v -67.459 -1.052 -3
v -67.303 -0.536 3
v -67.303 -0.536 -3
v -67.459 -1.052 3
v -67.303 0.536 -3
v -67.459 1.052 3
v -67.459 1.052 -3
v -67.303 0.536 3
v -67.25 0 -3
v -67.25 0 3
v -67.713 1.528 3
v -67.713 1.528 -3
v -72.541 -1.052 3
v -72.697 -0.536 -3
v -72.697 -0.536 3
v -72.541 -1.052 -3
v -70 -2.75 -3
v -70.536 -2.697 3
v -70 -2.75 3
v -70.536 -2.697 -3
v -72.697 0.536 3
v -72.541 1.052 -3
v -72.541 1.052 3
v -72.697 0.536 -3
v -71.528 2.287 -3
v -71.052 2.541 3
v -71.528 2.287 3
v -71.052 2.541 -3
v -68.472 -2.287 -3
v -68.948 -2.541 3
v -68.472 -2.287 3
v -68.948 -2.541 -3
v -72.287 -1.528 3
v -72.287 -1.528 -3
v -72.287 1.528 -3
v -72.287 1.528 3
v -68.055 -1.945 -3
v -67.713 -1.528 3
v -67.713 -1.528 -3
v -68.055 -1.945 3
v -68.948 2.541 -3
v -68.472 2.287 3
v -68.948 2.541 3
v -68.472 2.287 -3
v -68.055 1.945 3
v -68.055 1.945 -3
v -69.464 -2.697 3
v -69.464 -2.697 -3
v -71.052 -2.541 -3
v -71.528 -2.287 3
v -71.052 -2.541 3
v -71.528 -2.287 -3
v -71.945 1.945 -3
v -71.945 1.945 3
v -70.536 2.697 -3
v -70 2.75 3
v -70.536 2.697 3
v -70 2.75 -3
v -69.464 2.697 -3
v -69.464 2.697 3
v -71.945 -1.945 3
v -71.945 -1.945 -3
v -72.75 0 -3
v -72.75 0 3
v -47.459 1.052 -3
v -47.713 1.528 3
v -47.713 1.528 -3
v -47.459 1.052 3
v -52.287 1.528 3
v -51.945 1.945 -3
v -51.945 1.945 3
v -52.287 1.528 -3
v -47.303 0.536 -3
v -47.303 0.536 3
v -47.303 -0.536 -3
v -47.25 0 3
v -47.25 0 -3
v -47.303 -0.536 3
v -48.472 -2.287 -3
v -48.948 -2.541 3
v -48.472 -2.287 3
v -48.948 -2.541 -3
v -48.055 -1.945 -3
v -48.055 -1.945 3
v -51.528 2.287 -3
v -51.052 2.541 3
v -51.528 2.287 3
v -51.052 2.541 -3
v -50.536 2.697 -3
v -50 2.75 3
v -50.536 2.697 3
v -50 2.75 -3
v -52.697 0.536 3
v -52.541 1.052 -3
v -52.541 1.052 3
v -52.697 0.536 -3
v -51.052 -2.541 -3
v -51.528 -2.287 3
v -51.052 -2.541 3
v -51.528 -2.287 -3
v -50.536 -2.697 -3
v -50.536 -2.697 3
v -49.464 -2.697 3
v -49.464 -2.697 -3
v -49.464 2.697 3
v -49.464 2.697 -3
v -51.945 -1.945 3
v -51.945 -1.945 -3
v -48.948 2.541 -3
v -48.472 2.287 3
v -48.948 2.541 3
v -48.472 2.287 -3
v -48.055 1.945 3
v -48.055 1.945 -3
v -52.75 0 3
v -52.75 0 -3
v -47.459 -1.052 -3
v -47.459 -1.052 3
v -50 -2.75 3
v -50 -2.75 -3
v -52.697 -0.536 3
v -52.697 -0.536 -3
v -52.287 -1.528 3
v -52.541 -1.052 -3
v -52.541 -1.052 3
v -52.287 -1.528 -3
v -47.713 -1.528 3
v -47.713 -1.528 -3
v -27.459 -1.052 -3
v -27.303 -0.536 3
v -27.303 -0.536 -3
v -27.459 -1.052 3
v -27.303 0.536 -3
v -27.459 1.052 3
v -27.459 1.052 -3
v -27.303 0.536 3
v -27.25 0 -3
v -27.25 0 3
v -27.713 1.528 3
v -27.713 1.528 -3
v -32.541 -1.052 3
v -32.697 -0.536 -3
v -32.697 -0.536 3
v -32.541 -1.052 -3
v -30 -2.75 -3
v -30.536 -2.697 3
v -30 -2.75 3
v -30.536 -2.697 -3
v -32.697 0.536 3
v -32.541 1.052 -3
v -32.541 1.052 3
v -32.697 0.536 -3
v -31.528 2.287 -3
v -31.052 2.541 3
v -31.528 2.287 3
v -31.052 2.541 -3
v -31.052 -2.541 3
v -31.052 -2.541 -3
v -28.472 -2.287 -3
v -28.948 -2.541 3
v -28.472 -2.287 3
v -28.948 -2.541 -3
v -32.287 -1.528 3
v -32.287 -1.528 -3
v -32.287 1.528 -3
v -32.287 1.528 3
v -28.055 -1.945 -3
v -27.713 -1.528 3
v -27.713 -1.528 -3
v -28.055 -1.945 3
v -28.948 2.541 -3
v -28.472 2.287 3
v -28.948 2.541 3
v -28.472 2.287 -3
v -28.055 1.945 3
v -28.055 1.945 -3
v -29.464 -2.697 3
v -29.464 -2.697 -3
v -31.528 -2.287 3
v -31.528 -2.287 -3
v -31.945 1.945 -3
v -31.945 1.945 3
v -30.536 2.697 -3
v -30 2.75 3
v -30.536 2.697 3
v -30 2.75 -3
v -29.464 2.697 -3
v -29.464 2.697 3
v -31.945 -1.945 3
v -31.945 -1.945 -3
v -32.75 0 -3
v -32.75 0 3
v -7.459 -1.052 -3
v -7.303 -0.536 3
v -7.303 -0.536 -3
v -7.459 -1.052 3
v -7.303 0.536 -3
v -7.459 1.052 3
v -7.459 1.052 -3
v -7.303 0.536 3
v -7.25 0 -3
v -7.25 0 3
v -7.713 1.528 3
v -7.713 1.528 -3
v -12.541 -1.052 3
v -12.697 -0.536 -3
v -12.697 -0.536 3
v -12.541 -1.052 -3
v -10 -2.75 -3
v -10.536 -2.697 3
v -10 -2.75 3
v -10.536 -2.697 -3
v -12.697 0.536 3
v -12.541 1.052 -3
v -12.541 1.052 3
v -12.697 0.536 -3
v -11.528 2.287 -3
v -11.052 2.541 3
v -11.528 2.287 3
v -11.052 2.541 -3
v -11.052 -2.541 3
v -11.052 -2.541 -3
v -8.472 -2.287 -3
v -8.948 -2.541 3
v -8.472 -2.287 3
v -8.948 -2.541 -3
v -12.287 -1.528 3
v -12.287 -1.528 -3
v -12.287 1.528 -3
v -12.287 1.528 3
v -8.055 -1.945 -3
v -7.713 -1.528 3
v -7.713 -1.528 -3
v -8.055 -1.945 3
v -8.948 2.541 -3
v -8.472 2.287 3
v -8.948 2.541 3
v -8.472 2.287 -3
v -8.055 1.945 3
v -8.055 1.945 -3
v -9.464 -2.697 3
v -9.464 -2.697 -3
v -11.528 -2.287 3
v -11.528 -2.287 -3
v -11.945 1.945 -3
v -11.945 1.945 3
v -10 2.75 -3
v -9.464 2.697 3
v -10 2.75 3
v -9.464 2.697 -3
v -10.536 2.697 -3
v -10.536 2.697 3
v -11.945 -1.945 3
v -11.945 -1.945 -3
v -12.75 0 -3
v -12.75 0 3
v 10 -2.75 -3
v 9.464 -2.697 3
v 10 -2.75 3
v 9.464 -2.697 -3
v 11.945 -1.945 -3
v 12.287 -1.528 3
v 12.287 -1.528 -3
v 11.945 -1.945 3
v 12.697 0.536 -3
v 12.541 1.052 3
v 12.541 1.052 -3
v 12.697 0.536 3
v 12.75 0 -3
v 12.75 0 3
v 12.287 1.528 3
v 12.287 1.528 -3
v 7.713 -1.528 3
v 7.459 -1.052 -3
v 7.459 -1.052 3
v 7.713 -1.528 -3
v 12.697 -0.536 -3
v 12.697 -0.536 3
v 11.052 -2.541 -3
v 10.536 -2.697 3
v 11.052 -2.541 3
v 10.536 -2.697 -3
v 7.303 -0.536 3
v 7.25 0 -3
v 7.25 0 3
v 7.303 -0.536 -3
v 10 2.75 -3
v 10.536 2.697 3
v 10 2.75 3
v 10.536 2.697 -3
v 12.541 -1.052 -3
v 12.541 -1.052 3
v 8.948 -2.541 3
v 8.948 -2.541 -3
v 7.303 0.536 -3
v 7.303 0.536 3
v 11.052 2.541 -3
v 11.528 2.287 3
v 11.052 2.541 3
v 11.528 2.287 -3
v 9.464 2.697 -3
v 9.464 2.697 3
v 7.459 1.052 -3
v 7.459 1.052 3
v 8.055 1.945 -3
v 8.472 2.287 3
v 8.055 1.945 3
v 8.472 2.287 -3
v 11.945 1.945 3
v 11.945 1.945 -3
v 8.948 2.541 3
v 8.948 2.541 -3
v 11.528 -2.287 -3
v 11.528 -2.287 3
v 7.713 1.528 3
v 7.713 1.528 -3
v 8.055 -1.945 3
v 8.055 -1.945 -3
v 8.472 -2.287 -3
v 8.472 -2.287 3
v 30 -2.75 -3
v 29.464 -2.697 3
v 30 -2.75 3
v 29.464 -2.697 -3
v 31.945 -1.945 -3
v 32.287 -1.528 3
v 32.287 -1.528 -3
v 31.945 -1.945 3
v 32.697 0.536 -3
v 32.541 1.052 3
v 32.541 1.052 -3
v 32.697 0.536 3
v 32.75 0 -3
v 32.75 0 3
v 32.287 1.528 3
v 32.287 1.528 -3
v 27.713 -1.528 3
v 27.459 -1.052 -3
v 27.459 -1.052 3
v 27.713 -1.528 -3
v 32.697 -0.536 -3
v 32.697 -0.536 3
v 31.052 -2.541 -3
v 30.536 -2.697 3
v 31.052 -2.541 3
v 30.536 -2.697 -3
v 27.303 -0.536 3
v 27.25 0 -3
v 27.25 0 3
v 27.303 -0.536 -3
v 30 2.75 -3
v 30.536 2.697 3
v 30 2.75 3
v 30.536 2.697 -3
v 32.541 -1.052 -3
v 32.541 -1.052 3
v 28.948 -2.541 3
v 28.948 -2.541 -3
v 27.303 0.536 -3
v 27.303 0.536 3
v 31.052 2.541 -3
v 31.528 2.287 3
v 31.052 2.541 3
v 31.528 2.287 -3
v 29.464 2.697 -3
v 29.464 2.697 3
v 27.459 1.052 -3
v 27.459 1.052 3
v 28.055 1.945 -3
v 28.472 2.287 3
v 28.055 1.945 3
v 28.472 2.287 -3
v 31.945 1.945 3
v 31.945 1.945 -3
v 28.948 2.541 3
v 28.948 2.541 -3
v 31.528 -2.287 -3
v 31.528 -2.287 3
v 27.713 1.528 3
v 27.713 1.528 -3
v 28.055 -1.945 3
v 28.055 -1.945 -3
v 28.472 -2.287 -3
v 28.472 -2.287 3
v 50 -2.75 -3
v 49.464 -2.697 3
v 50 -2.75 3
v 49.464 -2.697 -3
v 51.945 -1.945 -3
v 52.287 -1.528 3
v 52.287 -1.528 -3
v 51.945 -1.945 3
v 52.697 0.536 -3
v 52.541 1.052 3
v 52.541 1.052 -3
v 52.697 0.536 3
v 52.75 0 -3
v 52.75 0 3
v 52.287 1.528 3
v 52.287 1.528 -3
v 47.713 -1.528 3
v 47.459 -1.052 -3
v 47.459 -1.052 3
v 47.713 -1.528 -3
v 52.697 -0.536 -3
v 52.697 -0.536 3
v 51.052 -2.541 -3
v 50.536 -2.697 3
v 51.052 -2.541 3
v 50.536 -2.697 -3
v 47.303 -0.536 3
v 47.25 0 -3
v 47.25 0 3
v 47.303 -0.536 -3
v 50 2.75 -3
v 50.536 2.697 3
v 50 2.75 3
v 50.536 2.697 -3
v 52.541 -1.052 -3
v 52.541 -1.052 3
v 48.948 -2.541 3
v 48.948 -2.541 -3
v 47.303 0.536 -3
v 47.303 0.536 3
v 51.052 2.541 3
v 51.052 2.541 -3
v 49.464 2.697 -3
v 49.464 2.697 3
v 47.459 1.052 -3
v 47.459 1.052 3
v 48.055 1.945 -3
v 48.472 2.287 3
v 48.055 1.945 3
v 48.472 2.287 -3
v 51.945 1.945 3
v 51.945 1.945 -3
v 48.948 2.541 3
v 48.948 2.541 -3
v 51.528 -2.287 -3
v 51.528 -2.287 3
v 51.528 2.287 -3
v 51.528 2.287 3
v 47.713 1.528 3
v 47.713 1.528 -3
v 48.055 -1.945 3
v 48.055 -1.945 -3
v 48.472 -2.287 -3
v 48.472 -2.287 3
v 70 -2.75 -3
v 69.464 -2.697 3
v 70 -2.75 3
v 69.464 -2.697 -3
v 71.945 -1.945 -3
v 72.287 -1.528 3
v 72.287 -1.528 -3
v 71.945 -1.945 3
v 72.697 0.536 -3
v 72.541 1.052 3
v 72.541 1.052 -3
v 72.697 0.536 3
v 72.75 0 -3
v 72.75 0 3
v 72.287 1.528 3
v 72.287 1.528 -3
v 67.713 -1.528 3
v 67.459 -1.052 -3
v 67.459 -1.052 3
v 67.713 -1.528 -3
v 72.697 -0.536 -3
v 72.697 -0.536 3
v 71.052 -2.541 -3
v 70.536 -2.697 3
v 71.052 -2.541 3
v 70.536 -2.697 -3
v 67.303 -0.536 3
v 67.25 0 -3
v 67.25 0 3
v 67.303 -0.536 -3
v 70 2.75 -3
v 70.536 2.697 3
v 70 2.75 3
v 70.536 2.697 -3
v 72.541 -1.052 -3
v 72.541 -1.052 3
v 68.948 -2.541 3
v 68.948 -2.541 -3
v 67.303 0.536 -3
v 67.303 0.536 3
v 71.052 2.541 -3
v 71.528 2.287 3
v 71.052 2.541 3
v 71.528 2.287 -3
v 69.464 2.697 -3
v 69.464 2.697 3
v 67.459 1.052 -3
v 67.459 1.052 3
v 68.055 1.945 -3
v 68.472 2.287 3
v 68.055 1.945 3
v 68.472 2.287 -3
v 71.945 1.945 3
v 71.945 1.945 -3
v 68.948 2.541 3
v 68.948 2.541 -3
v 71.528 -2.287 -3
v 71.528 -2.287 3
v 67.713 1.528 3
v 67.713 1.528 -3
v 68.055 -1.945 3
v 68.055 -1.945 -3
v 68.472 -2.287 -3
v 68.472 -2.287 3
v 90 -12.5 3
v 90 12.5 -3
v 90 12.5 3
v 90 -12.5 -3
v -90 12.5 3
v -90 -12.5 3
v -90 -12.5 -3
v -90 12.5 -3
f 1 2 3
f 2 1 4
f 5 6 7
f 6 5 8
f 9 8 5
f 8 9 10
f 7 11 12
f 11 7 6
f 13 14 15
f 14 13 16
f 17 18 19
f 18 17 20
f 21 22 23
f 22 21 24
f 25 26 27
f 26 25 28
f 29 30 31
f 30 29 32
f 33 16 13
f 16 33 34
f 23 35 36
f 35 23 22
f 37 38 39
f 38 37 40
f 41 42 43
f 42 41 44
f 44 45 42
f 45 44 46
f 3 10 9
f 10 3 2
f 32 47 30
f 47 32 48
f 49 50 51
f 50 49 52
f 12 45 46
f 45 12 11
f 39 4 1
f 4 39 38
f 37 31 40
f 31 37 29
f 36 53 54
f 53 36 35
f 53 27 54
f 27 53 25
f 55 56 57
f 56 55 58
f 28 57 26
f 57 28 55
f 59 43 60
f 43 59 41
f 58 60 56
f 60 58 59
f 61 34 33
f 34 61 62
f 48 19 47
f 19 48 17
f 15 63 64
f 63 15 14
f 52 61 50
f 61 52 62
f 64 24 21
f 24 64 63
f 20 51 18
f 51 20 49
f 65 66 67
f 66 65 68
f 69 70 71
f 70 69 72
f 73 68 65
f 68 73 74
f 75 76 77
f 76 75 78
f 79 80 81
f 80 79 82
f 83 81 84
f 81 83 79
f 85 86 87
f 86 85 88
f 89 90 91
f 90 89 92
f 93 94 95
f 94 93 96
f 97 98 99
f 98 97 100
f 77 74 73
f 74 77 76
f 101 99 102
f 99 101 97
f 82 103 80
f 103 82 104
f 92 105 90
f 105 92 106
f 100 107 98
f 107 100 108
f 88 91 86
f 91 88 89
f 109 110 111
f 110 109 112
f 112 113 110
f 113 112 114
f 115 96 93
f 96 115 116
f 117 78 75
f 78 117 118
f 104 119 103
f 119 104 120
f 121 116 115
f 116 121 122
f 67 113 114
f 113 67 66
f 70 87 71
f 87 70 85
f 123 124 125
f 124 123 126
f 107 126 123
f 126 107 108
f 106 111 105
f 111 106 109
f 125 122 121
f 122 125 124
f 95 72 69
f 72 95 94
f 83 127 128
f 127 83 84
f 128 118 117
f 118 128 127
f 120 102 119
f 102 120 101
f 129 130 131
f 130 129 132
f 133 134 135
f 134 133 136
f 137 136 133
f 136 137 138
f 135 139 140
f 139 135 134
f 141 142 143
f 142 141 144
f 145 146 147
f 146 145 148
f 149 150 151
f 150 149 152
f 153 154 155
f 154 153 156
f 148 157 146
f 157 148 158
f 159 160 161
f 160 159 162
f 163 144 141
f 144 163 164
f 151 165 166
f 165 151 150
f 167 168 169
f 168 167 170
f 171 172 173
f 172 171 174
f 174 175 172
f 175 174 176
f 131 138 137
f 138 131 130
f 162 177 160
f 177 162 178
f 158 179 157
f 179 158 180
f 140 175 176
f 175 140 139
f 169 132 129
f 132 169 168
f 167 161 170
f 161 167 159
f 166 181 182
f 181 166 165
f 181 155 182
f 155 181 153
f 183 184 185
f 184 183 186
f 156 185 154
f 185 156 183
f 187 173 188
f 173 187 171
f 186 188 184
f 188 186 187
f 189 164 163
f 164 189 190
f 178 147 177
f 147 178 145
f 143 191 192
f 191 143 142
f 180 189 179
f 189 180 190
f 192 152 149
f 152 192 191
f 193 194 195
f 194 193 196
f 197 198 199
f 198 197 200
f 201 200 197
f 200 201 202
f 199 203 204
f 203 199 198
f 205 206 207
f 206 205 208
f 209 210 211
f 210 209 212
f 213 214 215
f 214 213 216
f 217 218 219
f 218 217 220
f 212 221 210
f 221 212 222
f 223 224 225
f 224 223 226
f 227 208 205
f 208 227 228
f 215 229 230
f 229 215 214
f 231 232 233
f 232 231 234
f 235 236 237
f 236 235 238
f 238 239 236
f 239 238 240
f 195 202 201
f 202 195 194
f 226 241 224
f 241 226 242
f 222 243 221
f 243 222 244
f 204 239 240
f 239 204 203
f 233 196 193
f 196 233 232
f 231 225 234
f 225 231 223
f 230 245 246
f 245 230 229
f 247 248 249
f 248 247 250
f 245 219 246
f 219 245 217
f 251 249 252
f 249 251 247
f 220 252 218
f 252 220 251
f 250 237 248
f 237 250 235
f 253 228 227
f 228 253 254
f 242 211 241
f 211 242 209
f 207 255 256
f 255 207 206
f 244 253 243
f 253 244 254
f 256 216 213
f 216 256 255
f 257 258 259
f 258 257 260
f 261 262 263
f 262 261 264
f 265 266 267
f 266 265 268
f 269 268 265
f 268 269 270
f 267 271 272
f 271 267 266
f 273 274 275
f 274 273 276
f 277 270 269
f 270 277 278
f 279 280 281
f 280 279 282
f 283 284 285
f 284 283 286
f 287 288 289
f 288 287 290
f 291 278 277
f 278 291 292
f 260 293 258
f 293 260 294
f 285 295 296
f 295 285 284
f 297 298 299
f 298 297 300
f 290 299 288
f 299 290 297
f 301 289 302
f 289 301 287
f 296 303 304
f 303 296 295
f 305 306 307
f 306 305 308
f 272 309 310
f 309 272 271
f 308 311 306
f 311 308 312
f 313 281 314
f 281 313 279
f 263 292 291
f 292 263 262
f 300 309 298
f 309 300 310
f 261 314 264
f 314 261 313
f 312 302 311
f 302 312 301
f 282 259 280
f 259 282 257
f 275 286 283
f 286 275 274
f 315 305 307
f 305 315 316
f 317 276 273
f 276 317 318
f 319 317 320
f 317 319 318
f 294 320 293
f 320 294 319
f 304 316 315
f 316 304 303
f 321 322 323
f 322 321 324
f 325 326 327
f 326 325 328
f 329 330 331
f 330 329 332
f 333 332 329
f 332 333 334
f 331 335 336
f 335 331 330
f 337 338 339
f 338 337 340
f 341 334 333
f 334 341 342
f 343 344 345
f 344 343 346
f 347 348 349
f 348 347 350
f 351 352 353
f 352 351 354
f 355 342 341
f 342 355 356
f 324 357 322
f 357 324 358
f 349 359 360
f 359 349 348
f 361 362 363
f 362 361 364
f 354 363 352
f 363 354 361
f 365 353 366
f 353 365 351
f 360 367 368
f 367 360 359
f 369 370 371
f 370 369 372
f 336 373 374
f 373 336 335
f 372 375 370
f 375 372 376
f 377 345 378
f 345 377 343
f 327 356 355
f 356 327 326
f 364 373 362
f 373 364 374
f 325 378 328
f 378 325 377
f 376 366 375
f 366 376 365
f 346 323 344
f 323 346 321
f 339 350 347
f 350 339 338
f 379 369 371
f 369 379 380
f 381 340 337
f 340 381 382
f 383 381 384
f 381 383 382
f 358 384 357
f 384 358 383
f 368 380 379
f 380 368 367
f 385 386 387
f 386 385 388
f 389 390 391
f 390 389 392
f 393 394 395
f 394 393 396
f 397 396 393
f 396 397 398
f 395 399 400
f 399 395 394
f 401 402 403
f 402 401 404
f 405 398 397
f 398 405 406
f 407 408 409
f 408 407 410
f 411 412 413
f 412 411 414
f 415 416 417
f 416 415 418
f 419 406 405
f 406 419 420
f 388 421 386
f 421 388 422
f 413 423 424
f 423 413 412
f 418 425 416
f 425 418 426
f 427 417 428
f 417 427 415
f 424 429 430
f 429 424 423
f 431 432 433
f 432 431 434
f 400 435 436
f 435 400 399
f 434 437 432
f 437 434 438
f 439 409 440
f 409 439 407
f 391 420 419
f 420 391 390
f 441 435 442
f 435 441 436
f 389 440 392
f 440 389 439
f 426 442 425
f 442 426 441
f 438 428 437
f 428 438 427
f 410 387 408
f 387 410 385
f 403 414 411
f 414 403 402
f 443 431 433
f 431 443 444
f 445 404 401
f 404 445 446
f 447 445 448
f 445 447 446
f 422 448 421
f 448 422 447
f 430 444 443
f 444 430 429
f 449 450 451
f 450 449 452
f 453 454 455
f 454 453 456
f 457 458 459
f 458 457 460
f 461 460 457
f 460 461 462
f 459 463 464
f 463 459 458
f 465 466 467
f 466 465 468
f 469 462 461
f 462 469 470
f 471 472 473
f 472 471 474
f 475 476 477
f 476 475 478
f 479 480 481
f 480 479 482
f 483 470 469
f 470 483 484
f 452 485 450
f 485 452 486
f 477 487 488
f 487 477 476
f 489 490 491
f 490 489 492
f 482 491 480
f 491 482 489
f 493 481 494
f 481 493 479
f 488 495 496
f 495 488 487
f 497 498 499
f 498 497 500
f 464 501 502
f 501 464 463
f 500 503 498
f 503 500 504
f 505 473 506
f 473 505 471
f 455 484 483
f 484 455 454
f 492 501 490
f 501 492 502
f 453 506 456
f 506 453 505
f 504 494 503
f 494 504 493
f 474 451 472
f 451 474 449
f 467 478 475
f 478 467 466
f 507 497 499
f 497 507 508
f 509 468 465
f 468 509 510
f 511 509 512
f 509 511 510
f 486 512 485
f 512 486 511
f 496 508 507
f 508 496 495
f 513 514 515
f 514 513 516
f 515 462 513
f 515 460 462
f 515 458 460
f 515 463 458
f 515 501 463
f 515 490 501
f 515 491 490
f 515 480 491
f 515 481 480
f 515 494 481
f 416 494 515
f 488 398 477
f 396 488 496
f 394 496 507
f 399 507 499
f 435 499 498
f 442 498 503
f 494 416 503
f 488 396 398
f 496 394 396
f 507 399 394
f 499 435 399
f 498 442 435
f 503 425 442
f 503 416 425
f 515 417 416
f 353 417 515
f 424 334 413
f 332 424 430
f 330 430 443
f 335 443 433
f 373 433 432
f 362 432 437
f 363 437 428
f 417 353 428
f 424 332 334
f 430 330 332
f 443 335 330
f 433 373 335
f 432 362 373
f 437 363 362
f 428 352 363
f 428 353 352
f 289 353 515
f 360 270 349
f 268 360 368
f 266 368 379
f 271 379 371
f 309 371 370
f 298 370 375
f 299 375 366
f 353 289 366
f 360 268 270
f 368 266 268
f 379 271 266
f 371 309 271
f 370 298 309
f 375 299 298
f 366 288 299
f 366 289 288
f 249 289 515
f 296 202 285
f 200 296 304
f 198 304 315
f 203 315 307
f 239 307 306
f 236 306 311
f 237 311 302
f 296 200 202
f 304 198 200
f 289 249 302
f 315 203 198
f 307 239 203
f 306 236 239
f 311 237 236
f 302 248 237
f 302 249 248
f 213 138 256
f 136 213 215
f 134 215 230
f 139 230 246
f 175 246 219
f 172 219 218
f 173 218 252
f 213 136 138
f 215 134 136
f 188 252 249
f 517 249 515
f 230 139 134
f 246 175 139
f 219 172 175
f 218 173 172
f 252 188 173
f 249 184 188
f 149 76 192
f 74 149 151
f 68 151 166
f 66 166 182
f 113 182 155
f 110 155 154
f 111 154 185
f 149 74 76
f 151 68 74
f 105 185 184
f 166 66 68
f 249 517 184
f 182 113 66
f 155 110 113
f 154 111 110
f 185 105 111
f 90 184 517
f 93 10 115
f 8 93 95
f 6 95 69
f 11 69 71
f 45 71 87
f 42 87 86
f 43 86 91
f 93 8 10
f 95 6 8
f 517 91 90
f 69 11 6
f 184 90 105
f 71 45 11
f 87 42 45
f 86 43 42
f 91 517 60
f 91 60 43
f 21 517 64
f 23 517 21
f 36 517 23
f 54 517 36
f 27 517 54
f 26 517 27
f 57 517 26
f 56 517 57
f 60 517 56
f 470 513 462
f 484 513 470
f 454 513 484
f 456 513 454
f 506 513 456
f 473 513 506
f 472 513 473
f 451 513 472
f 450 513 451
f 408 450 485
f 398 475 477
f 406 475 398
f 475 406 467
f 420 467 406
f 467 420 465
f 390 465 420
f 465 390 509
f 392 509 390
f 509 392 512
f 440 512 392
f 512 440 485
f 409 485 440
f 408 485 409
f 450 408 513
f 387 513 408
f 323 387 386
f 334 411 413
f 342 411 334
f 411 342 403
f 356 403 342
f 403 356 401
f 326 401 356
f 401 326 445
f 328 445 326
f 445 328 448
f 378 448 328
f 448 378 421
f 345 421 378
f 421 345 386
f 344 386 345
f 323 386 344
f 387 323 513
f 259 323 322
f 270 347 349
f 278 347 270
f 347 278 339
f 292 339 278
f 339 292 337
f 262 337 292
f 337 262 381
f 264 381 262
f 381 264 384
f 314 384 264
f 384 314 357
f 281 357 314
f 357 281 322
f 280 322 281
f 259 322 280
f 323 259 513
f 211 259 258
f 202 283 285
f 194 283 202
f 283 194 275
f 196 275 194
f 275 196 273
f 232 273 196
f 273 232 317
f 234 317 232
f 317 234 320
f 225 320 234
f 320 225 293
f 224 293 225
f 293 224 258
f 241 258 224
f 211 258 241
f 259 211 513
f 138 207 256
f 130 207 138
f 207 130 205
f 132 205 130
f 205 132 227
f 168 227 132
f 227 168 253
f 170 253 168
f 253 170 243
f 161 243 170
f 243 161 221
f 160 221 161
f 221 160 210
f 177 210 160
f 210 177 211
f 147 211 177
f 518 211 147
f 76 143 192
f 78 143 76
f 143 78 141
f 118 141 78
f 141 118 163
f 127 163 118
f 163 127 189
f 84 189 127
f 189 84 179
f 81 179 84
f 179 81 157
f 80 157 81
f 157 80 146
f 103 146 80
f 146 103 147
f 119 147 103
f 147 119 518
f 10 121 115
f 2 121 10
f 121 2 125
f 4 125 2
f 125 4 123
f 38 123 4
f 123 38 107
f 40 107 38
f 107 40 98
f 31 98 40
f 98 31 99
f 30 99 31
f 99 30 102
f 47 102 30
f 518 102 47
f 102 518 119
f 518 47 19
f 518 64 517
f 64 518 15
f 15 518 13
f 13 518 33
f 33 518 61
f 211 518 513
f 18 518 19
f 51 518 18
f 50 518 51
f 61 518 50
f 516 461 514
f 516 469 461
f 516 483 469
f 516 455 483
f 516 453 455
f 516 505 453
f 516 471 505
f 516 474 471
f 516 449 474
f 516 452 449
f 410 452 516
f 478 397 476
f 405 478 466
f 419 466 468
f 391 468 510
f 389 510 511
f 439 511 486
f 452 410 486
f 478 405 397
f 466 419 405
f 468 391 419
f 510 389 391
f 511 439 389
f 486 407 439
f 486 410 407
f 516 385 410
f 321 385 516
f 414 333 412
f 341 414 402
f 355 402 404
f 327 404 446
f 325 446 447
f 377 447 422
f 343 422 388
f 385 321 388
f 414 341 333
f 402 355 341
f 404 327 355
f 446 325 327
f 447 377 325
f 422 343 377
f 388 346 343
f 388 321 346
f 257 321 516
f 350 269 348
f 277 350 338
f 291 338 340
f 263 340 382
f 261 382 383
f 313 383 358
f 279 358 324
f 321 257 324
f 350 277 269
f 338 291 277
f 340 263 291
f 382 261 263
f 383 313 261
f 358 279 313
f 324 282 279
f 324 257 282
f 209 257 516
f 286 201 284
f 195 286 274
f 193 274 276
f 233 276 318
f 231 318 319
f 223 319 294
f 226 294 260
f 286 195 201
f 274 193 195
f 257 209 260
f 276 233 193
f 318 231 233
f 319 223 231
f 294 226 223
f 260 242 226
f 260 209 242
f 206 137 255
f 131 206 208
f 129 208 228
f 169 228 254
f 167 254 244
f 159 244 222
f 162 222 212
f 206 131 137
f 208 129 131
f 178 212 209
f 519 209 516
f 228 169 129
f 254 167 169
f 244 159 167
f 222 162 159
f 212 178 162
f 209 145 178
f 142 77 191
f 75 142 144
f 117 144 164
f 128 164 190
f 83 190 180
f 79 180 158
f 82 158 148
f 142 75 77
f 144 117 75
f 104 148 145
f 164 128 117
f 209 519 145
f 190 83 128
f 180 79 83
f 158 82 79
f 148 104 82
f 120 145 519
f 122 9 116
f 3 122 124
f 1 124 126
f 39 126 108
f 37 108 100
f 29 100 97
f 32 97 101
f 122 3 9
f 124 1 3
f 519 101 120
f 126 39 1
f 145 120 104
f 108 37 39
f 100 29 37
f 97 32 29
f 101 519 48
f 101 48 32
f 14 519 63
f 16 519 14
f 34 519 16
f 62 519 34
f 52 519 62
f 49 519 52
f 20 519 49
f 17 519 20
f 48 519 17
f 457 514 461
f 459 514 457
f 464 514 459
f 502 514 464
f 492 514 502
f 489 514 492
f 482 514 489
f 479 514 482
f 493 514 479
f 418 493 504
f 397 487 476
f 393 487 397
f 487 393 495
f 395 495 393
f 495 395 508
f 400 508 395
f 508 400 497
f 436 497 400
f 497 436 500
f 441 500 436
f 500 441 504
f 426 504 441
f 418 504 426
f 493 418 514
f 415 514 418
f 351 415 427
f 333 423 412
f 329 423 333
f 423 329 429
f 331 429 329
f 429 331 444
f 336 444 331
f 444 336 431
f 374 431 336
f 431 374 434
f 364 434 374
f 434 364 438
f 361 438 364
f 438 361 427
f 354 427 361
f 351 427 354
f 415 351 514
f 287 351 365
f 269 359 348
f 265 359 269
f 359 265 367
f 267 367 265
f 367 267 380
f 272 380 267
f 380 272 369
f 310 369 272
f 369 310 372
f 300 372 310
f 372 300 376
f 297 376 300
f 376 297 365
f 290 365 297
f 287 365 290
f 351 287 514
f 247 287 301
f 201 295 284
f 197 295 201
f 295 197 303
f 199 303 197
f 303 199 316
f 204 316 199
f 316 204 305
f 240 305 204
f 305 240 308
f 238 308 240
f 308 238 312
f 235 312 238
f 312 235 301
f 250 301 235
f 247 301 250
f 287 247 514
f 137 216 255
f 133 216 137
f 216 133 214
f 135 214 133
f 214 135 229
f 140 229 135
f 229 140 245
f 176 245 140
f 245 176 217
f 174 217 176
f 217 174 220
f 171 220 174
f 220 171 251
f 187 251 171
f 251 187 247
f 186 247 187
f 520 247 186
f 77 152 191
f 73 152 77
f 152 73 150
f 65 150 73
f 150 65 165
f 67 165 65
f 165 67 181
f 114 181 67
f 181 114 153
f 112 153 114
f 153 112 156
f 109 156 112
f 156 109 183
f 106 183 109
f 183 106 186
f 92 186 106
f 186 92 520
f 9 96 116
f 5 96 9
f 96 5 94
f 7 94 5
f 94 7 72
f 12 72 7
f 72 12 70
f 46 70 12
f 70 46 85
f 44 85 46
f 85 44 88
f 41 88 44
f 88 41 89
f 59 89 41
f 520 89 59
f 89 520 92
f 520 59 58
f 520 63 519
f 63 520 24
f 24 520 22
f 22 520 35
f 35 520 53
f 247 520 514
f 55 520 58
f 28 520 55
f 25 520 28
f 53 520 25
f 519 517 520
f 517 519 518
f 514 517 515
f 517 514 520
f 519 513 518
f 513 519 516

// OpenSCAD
$fn = 32;

// ----------------------------------------------------------------------
// Hole bar, 8 x Ø5.5
// skip layout, 20 mm edge offset
// ----------------------------------------------------------------------

// --- parameters (mm) ---
bar_w = 25;       // bar width (Y)
bar_t = 6;        // bar thickness (Z)
holes = 8;        // holes per row
hole_d = 5.5;     // hole diameter
edge = 20;        // offset from the bar end to the first hole
grid_pitch = 10;  // grid the bar was laid out on

// --- derived feature positions (mm) ---
pitch = grid_pitch * 2;       // = 20   holes sit every other grid slot
span = (holes - 1) * pitch;   // = 140   distance between the end holes
bar_l = span + 2 * edge;      // = 180   overall bar length
start_x = -bar_l / 2 + edge;  // = -70   X of the first hole
feature_centers = [
  [start_x + 0 * pitch, 0],
  [start_x + 1 * pitch, 0],
  [start_x + 2 * pitch, 0],
  [start_x + 3 * pitch, 0],
  [start_x + 4 * pitch, 0],
  [start_x + 5 * pitch, 0],
  [start_x + 6 * pitch, 0],
  [start_x + 7 * pitch, 0]
];   // hole centres of the first row

// bar with one row of holes, drilled from feature_centers
difference() {
  translate([-bar_l / 2, -bar_w / 2, -bar_t / 2]) cube([bar_l, bar_w, bar_t]);
  for (centre = feature_centers)
    translate([centre[0], centre[1], 0])
      cylinder(d = hole_d, h = bar_t + 2, center = true);
}
